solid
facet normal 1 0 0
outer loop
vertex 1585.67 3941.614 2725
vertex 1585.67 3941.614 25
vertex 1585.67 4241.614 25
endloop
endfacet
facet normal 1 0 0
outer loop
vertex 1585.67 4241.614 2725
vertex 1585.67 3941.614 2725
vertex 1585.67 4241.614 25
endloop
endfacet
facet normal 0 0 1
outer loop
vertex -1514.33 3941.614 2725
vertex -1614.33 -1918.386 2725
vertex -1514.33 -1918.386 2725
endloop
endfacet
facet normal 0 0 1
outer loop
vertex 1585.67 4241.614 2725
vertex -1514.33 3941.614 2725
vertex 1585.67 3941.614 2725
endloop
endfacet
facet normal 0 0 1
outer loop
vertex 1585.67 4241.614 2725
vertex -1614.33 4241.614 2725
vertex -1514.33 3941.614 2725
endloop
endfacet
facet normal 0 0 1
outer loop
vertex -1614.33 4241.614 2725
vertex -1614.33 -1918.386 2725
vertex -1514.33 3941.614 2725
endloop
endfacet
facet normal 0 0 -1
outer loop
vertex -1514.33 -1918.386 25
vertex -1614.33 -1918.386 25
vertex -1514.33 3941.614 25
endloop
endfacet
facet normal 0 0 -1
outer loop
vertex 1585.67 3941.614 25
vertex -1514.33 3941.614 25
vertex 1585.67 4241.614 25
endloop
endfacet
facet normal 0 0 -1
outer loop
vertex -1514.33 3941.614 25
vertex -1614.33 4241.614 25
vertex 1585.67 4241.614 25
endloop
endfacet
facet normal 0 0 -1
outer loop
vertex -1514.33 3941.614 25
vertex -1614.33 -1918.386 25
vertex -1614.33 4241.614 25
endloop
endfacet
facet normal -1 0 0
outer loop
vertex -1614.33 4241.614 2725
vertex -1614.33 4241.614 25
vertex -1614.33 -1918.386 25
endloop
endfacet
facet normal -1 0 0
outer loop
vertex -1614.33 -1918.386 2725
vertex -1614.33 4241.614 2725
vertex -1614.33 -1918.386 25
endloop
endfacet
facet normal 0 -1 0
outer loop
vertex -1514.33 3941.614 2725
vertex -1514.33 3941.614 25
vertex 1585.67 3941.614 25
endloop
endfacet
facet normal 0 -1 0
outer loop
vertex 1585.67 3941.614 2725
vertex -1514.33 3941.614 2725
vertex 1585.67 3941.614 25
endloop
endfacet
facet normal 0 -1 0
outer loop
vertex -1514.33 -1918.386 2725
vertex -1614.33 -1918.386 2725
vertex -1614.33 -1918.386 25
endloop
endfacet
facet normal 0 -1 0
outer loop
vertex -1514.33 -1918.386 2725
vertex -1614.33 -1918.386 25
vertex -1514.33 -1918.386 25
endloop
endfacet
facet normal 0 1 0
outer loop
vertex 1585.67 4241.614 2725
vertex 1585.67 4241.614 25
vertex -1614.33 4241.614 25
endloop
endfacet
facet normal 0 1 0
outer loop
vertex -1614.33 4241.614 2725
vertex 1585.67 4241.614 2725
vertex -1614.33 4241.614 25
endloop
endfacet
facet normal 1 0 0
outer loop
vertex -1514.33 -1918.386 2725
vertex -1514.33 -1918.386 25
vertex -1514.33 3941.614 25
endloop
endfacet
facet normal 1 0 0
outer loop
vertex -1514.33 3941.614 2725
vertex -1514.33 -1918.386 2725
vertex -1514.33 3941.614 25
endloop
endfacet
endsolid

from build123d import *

# Parameters (mm, degrees)
F0_W     = 3200
F0_H     = 6160
F1_DEPTH = 25
F3_DEPTH = 2700
F4_W     = 4864.851475
F4_H     = 6786.141396
F5_DEPTH = 350


with BuildPart() as f1:
    # F0 (on Top) → F1 (new body)
    with BuildSketch(Plane.XY):
        with Locations((-14.329555, 1161.614112)):
            Rectangle(F0_W, F0_H)
    extrude(amount=F1_DEPTH)

    # F2 (on face) → F3 (join)
    with BuildSketch(Plane.XY.offset(25)):
        Polygon((-1614.329555, 4241.614112), (-1614.329555, -1918.385888), (-1514.329555, -1918.385888), (-1514.329555, 3941.614112), (1585.670445, 3941.614112), (1585.670445, 4241.614112), (-1514.329555, 4241.614112), align=None)
    extrude(amount=F3_DEPTH)

    # F4 (on face) → F5 (cut)
    with BuildSketch(Plane.XY.offset(25)):
        with Locations((355.838299, 1282.666683)):
            Rectangle(F4_W, F4_H)
    extrude(amount=-F5_DEPTH, mode=Mode.SUBTRACT)


solid = f1.part
